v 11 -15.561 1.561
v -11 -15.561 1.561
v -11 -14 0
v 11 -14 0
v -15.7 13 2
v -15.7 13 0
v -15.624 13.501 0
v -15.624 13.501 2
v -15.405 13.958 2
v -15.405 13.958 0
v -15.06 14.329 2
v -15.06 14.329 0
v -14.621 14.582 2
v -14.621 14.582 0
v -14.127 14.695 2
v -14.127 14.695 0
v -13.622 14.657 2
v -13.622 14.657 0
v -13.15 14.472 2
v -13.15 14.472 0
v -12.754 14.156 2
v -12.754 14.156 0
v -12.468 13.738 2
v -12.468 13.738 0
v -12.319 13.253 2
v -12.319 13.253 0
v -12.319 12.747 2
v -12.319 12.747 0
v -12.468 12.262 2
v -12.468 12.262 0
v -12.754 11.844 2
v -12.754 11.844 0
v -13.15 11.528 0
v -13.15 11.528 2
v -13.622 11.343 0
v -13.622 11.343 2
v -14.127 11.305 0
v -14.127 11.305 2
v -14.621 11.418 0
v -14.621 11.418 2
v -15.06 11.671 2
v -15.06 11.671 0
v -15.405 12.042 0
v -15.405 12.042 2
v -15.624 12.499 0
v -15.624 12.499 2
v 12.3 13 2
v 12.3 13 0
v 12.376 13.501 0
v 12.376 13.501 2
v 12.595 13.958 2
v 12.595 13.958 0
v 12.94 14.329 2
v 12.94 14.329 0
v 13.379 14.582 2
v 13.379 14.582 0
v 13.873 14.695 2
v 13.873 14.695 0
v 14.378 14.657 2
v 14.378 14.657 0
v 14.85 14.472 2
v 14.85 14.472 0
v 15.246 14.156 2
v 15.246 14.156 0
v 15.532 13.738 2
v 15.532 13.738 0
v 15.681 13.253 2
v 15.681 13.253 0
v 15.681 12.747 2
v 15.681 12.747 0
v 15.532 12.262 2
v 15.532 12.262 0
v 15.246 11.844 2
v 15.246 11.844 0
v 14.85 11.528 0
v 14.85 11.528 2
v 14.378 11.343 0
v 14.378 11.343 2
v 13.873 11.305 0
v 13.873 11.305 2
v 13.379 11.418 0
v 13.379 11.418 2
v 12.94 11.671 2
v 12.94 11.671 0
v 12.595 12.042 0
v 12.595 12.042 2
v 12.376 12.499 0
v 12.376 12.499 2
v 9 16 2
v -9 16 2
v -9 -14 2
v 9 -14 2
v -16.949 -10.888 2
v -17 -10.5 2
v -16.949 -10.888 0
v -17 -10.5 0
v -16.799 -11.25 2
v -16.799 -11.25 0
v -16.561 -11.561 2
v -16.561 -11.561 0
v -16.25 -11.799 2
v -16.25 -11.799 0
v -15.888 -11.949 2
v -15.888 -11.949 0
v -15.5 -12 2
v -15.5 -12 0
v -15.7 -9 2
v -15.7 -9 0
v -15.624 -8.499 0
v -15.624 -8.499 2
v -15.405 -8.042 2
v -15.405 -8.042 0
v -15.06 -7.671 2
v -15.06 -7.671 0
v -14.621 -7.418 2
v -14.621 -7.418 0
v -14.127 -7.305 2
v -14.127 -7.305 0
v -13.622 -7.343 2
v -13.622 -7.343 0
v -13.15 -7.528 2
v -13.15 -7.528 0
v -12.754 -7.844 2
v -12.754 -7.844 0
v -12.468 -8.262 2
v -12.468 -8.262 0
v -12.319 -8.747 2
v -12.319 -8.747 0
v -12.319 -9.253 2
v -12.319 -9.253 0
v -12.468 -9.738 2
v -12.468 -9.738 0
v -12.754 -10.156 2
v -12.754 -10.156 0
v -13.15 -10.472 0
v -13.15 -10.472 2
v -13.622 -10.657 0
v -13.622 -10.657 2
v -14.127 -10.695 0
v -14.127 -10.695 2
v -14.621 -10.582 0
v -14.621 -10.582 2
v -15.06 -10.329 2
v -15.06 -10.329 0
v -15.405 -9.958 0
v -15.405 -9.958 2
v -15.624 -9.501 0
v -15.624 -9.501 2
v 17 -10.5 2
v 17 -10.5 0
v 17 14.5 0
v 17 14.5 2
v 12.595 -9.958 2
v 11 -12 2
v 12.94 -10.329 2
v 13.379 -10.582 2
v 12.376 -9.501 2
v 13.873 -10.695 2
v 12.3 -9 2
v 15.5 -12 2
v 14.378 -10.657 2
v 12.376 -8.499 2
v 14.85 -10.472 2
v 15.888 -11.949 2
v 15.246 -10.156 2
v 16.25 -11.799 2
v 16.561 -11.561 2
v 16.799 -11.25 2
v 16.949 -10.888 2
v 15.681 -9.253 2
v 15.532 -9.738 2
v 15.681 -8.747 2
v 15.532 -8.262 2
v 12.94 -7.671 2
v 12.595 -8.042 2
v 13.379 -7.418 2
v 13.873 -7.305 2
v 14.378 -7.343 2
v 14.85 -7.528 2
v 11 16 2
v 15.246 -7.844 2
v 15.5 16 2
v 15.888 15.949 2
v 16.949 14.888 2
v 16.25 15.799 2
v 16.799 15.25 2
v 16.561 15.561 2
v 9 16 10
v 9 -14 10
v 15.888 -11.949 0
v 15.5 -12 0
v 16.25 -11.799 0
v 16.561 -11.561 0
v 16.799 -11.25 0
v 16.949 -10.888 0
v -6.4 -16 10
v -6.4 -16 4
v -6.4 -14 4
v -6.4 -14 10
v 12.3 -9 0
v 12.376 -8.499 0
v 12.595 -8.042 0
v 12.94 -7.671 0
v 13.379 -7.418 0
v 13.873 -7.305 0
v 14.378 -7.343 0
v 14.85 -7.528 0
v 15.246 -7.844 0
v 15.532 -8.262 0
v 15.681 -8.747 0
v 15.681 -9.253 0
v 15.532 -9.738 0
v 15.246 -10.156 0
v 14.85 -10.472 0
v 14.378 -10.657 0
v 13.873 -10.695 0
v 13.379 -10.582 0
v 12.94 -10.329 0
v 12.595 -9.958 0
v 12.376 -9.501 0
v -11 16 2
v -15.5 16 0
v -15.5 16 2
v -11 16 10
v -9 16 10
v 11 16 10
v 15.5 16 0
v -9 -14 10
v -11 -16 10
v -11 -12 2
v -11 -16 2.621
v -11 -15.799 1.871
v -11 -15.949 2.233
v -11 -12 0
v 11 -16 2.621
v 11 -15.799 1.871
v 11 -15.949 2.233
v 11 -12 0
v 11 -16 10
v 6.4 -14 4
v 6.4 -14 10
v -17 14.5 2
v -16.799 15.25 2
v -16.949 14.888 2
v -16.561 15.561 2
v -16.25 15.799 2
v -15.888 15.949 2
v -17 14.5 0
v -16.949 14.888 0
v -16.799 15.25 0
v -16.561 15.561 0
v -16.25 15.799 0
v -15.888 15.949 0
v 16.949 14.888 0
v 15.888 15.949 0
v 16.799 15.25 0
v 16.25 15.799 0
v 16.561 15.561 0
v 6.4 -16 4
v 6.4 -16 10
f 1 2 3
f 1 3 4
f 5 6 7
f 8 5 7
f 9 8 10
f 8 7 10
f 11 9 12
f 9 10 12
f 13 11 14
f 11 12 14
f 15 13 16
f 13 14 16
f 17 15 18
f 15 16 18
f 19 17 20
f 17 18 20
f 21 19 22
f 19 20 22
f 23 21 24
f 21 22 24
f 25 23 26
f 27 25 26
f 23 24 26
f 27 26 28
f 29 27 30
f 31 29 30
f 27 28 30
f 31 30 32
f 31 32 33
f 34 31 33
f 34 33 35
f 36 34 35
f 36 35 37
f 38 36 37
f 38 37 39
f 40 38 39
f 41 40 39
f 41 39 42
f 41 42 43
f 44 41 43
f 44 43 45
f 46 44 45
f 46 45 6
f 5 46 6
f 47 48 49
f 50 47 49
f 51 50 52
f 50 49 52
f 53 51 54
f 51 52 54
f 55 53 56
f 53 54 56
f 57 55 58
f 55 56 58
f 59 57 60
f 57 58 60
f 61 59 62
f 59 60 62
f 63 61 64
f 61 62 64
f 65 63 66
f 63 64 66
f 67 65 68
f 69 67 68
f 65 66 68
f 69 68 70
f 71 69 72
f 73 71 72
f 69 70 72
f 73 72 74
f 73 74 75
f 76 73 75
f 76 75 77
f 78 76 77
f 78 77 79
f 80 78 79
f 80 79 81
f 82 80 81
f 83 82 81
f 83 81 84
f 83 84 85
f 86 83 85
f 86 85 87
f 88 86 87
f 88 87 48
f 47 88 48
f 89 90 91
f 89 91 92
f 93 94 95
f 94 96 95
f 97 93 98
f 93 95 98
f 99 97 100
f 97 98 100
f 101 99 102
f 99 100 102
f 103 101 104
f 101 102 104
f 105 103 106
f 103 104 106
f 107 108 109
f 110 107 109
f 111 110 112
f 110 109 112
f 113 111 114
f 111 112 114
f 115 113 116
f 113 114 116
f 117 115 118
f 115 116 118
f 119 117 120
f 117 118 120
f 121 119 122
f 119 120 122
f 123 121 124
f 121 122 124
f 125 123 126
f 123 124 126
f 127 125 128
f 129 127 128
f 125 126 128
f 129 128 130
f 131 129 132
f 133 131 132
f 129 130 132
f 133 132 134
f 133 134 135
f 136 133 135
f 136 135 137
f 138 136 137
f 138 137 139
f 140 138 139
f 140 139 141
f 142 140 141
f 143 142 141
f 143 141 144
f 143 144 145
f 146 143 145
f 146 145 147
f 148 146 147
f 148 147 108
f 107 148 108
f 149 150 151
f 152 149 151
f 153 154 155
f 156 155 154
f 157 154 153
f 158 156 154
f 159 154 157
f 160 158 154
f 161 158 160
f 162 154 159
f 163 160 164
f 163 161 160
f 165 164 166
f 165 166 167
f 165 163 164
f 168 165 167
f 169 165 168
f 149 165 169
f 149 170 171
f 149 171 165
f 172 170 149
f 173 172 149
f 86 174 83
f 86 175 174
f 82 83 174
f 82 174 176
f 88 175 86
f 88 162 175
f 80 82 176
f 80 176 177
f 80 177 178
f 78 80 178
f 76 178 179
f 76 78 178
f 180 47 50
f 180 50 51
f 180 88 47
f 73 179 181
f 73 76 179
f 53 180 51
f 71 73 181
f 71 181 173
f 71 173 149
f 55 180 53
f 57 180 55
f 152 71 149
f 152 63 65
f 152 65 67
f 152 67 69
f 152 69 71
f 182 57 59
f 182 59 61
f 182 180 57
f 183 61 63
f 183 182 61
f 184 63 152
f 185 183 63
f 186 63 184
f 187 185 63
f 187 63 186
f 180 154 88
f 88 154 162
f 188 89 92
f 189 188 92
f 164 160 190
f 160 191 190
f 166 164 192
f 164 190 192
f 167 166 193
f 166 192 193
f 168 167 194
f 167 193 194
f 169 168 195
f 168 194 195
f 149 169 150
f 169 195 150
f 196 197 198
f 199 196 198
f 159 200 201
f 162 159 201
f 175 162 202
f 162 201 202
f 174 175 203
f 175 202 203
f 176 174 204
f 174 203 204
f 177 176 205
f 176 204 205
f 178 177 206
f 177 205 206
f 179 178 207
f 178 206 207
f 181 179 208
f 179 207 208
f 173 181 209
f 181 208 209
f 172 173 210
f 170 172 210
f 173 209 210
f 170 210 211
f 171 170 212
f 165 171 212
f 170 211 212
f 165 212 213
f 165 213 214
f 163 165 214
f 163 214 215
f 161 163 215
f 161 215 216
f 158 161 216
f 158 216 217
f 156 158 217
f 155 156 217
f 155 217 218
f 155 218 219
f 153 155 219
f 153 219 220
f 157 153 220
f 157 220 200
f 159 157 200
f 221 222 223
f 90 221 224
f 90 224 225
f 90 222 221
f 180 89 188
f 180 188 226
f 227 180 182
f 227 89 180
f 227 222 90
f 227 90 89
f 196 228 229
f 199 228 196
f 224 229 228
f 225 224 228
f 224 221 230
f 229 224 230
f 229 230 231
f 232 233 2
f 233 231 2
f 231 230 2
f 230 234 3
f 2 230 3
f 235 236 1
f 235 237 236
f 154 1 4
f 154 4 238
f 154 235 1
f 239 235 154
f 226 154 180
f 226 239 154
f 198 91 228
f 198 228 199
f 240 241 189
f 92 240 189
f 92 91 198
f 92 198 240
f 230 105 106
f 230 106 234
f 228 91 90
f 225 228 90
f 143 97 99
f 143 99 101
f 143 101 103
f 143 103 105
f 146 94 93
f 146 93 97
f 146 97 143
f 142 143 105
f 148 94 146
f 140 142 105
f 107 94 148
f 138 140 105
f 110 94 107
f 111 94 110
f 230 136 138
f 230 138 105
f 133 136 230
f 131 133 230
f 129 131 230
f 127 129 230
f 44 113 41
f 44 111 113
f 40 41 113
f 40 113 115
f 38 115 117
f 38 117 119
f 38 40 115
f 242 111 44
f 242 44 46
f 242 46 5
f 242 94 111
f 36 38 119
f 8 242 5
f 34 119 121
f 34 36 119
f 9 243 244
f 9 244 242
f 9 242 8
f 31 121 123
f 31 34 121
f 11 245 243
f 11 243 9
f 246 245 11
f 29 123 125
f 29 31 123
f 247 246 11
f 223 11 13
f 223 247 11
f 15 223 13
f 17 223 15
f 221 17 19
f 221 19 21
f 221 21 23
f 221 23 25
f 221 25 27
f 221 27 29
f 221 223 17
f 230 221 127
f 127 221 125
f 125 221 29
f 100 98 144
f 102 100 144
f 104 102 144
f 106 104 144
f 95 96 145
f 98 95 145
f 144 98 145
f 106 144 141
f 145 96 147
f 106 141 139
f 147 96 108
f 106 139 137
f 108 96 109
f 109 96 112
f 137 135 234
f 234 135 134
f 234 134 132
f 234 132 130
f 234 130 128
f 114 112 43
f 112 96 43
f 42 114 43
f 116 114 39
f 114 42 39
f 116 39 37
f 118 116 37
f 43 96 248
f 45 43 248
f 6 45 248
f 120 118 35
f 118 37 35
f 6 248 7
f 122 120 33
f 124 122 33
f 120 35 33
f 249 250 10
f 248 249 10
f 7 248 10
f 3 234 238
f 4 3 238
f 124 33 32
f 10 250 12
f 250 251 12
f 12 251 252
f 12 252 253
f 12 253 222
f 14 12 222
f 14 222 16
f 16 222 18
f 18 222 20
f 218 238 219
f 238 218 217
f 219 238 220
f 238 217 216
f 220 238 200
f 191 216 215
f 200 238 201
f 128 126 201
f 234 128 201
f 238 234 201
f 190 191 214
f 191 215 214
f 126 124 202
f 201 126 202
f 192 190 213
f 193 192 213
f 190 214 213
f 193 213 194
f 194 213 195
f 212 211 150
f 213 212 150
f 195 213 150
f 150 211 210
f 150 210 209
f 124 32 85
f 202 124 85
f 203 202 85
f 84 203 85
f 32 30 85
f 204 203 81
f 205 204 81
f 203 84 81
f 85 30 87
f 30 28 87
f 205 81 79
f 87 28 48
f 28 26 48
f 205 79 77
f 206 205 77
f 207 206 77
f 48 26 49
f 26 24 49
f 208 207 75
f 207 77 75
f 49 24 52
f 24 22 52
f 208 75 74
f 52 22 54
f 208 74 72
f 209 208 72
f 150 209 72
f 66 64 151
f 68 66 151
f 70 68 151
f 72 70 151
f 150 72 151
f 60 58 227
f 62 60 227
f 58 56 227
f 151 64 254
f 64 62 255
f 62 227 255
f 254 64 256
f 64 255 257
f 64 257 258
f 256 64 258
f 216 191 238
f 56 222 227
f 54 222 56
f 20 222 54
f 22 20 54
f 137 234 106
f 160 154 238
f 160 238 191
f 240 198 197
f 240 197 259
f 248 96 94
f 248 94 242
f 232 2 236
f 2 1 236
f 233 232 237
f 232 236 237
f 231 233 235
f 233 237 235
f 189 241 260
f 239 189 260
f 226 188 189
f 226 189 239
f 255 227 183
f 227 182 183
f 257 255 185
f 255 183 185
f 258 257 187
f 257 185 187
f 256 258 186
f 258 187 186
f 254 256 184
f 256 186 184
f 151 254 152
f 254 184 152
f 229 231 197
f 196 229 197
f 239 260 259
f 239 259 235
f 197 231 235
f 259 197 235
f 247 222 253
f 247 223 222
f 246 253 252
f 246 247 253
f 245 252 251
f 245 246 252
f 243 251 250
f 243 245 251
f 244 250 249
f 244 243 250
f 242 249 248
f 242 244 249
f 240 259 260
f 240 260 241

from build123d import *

# Parameters (mm, degrees)
SKETCH1_W                = 34
SKETCH1_H                = 32
BOSS_EXTRUDE1_DEPTH      = 2
BOSS_EXTRUDE2_DEPTH      = 8
SKETCH2_4_W              = 12.8
SKETCH2_4_H              = 2
BOSS_EXTRUDE3_DEPTH      = 2
SKETCH3_W                = 6
SKETCH3_H                = 4
CUT_EXTRUDE1_DEPTH       = 9
M3_CLEARANCE_HOLE1_D     = 3.4
M3_CLEARANCE_HOLE1_DEPTH = 10
M3_CLEARANCE_HOLE1_TIP   = 1.021463052
FILLET1_R                = 1.5
CHAMFER1_SIZE            = 2
FILLET2_R                = 1.5


with BuildPart() as part:
    # Sketch1 → Boss-Extrude1 (new body)
    with BuildSketch(Plane.XY):
        Rectangle(SKETCH1_W, SKETCH1_H)
    extrude(amount=BOSS_EXTRUDE1_DEPTH)

    # Sketch2 → Boss-Extrude2 (add)
    with BuildSketch(Plane.XY.offset(2)):
        Polygon((-9, 16), (-11, 16), (-11, -16), (-6.4, -16), (-6.4, -14), (-9, -14), align=None)
        Polygon((11, 16), (9, 16), (9, -14), (6.4, -14), (6.4, -16), (11, -16), align=None)
    extrude(amount=BOSS_EXTRUDE2_DEPTH)

    # Sketch2<4> → Boss-Extrude3 (add)
    with BuildSketch(Plane.XY.offset(2)):
        with Locations((0, -15)):
            Rectangle(SKETCH2_4_W, SKETCH2_4_H)
    extrude(amount=BOSS_EXTRUDE3_DEPTH)

    # Sketch3 → Cut-Extrude1 (cut)
    with BuildSketch(Plane.XY.offset(2)):
        with Locations((-14, -14)):
            Rectangle(SKETCH3_W, SKETCH3_H)
        with Locations((14, -14)):
            Rectangle(SKETCH3_W, SKETCH3_H)
    extrude(amount=-CUT_EXTRUDE1_DEPTH, mode=Mode.SUBTRACT)

    # M3 Clearance Hole1
    with Locations(Plane.XY.offset(2)):
        with Locations((-14, 13), (14, -9), (-14, -9), (14, 13)):
            Hole(M3_CLEARANCE_HOLE1_D / 2, depth=M3_CLEARANCE_HOLE1_DEPTH)
            with Locations((0, 0, -(M3_CLEARANCE_HOLE1_DEPTH + M3_CLEARANCE_HOLE1_TIP / 2))):  # 118° drill point
                Cone(0, M3_CLEARANCE_HOLE1_D / 2, M3_CLEARANCE_HOLE1_TIP, mode=Mode.SUBTRACT)

    # Fillet1
    fillet1_edges = [part.edges().sort_by_distance(p)[0] for p in [
        (-17, 16, 1),
        (17, 16, 1),
        (17, -12, 1),
        (-17, -12, 1),
    ]]
    fillet(fillet1_edges, radius=FILLET1_R)

    # Chamfer1
    chamfer1_edges = [part.edges().sort_by_distance(p)[0] for p in [
        (0, -16, 0),
    ]]
    chamfer(chamfer1_edges, length=CHAMFER1_SIZE)

    # Fillet2
    fillet2_edges = [part.edges().sort_by_distance(p)[0] for p in [
        (0, -16, 2),
    ]]
    fillet(fillet2_edges, radius=FILLET2_R)


solid = part.part
